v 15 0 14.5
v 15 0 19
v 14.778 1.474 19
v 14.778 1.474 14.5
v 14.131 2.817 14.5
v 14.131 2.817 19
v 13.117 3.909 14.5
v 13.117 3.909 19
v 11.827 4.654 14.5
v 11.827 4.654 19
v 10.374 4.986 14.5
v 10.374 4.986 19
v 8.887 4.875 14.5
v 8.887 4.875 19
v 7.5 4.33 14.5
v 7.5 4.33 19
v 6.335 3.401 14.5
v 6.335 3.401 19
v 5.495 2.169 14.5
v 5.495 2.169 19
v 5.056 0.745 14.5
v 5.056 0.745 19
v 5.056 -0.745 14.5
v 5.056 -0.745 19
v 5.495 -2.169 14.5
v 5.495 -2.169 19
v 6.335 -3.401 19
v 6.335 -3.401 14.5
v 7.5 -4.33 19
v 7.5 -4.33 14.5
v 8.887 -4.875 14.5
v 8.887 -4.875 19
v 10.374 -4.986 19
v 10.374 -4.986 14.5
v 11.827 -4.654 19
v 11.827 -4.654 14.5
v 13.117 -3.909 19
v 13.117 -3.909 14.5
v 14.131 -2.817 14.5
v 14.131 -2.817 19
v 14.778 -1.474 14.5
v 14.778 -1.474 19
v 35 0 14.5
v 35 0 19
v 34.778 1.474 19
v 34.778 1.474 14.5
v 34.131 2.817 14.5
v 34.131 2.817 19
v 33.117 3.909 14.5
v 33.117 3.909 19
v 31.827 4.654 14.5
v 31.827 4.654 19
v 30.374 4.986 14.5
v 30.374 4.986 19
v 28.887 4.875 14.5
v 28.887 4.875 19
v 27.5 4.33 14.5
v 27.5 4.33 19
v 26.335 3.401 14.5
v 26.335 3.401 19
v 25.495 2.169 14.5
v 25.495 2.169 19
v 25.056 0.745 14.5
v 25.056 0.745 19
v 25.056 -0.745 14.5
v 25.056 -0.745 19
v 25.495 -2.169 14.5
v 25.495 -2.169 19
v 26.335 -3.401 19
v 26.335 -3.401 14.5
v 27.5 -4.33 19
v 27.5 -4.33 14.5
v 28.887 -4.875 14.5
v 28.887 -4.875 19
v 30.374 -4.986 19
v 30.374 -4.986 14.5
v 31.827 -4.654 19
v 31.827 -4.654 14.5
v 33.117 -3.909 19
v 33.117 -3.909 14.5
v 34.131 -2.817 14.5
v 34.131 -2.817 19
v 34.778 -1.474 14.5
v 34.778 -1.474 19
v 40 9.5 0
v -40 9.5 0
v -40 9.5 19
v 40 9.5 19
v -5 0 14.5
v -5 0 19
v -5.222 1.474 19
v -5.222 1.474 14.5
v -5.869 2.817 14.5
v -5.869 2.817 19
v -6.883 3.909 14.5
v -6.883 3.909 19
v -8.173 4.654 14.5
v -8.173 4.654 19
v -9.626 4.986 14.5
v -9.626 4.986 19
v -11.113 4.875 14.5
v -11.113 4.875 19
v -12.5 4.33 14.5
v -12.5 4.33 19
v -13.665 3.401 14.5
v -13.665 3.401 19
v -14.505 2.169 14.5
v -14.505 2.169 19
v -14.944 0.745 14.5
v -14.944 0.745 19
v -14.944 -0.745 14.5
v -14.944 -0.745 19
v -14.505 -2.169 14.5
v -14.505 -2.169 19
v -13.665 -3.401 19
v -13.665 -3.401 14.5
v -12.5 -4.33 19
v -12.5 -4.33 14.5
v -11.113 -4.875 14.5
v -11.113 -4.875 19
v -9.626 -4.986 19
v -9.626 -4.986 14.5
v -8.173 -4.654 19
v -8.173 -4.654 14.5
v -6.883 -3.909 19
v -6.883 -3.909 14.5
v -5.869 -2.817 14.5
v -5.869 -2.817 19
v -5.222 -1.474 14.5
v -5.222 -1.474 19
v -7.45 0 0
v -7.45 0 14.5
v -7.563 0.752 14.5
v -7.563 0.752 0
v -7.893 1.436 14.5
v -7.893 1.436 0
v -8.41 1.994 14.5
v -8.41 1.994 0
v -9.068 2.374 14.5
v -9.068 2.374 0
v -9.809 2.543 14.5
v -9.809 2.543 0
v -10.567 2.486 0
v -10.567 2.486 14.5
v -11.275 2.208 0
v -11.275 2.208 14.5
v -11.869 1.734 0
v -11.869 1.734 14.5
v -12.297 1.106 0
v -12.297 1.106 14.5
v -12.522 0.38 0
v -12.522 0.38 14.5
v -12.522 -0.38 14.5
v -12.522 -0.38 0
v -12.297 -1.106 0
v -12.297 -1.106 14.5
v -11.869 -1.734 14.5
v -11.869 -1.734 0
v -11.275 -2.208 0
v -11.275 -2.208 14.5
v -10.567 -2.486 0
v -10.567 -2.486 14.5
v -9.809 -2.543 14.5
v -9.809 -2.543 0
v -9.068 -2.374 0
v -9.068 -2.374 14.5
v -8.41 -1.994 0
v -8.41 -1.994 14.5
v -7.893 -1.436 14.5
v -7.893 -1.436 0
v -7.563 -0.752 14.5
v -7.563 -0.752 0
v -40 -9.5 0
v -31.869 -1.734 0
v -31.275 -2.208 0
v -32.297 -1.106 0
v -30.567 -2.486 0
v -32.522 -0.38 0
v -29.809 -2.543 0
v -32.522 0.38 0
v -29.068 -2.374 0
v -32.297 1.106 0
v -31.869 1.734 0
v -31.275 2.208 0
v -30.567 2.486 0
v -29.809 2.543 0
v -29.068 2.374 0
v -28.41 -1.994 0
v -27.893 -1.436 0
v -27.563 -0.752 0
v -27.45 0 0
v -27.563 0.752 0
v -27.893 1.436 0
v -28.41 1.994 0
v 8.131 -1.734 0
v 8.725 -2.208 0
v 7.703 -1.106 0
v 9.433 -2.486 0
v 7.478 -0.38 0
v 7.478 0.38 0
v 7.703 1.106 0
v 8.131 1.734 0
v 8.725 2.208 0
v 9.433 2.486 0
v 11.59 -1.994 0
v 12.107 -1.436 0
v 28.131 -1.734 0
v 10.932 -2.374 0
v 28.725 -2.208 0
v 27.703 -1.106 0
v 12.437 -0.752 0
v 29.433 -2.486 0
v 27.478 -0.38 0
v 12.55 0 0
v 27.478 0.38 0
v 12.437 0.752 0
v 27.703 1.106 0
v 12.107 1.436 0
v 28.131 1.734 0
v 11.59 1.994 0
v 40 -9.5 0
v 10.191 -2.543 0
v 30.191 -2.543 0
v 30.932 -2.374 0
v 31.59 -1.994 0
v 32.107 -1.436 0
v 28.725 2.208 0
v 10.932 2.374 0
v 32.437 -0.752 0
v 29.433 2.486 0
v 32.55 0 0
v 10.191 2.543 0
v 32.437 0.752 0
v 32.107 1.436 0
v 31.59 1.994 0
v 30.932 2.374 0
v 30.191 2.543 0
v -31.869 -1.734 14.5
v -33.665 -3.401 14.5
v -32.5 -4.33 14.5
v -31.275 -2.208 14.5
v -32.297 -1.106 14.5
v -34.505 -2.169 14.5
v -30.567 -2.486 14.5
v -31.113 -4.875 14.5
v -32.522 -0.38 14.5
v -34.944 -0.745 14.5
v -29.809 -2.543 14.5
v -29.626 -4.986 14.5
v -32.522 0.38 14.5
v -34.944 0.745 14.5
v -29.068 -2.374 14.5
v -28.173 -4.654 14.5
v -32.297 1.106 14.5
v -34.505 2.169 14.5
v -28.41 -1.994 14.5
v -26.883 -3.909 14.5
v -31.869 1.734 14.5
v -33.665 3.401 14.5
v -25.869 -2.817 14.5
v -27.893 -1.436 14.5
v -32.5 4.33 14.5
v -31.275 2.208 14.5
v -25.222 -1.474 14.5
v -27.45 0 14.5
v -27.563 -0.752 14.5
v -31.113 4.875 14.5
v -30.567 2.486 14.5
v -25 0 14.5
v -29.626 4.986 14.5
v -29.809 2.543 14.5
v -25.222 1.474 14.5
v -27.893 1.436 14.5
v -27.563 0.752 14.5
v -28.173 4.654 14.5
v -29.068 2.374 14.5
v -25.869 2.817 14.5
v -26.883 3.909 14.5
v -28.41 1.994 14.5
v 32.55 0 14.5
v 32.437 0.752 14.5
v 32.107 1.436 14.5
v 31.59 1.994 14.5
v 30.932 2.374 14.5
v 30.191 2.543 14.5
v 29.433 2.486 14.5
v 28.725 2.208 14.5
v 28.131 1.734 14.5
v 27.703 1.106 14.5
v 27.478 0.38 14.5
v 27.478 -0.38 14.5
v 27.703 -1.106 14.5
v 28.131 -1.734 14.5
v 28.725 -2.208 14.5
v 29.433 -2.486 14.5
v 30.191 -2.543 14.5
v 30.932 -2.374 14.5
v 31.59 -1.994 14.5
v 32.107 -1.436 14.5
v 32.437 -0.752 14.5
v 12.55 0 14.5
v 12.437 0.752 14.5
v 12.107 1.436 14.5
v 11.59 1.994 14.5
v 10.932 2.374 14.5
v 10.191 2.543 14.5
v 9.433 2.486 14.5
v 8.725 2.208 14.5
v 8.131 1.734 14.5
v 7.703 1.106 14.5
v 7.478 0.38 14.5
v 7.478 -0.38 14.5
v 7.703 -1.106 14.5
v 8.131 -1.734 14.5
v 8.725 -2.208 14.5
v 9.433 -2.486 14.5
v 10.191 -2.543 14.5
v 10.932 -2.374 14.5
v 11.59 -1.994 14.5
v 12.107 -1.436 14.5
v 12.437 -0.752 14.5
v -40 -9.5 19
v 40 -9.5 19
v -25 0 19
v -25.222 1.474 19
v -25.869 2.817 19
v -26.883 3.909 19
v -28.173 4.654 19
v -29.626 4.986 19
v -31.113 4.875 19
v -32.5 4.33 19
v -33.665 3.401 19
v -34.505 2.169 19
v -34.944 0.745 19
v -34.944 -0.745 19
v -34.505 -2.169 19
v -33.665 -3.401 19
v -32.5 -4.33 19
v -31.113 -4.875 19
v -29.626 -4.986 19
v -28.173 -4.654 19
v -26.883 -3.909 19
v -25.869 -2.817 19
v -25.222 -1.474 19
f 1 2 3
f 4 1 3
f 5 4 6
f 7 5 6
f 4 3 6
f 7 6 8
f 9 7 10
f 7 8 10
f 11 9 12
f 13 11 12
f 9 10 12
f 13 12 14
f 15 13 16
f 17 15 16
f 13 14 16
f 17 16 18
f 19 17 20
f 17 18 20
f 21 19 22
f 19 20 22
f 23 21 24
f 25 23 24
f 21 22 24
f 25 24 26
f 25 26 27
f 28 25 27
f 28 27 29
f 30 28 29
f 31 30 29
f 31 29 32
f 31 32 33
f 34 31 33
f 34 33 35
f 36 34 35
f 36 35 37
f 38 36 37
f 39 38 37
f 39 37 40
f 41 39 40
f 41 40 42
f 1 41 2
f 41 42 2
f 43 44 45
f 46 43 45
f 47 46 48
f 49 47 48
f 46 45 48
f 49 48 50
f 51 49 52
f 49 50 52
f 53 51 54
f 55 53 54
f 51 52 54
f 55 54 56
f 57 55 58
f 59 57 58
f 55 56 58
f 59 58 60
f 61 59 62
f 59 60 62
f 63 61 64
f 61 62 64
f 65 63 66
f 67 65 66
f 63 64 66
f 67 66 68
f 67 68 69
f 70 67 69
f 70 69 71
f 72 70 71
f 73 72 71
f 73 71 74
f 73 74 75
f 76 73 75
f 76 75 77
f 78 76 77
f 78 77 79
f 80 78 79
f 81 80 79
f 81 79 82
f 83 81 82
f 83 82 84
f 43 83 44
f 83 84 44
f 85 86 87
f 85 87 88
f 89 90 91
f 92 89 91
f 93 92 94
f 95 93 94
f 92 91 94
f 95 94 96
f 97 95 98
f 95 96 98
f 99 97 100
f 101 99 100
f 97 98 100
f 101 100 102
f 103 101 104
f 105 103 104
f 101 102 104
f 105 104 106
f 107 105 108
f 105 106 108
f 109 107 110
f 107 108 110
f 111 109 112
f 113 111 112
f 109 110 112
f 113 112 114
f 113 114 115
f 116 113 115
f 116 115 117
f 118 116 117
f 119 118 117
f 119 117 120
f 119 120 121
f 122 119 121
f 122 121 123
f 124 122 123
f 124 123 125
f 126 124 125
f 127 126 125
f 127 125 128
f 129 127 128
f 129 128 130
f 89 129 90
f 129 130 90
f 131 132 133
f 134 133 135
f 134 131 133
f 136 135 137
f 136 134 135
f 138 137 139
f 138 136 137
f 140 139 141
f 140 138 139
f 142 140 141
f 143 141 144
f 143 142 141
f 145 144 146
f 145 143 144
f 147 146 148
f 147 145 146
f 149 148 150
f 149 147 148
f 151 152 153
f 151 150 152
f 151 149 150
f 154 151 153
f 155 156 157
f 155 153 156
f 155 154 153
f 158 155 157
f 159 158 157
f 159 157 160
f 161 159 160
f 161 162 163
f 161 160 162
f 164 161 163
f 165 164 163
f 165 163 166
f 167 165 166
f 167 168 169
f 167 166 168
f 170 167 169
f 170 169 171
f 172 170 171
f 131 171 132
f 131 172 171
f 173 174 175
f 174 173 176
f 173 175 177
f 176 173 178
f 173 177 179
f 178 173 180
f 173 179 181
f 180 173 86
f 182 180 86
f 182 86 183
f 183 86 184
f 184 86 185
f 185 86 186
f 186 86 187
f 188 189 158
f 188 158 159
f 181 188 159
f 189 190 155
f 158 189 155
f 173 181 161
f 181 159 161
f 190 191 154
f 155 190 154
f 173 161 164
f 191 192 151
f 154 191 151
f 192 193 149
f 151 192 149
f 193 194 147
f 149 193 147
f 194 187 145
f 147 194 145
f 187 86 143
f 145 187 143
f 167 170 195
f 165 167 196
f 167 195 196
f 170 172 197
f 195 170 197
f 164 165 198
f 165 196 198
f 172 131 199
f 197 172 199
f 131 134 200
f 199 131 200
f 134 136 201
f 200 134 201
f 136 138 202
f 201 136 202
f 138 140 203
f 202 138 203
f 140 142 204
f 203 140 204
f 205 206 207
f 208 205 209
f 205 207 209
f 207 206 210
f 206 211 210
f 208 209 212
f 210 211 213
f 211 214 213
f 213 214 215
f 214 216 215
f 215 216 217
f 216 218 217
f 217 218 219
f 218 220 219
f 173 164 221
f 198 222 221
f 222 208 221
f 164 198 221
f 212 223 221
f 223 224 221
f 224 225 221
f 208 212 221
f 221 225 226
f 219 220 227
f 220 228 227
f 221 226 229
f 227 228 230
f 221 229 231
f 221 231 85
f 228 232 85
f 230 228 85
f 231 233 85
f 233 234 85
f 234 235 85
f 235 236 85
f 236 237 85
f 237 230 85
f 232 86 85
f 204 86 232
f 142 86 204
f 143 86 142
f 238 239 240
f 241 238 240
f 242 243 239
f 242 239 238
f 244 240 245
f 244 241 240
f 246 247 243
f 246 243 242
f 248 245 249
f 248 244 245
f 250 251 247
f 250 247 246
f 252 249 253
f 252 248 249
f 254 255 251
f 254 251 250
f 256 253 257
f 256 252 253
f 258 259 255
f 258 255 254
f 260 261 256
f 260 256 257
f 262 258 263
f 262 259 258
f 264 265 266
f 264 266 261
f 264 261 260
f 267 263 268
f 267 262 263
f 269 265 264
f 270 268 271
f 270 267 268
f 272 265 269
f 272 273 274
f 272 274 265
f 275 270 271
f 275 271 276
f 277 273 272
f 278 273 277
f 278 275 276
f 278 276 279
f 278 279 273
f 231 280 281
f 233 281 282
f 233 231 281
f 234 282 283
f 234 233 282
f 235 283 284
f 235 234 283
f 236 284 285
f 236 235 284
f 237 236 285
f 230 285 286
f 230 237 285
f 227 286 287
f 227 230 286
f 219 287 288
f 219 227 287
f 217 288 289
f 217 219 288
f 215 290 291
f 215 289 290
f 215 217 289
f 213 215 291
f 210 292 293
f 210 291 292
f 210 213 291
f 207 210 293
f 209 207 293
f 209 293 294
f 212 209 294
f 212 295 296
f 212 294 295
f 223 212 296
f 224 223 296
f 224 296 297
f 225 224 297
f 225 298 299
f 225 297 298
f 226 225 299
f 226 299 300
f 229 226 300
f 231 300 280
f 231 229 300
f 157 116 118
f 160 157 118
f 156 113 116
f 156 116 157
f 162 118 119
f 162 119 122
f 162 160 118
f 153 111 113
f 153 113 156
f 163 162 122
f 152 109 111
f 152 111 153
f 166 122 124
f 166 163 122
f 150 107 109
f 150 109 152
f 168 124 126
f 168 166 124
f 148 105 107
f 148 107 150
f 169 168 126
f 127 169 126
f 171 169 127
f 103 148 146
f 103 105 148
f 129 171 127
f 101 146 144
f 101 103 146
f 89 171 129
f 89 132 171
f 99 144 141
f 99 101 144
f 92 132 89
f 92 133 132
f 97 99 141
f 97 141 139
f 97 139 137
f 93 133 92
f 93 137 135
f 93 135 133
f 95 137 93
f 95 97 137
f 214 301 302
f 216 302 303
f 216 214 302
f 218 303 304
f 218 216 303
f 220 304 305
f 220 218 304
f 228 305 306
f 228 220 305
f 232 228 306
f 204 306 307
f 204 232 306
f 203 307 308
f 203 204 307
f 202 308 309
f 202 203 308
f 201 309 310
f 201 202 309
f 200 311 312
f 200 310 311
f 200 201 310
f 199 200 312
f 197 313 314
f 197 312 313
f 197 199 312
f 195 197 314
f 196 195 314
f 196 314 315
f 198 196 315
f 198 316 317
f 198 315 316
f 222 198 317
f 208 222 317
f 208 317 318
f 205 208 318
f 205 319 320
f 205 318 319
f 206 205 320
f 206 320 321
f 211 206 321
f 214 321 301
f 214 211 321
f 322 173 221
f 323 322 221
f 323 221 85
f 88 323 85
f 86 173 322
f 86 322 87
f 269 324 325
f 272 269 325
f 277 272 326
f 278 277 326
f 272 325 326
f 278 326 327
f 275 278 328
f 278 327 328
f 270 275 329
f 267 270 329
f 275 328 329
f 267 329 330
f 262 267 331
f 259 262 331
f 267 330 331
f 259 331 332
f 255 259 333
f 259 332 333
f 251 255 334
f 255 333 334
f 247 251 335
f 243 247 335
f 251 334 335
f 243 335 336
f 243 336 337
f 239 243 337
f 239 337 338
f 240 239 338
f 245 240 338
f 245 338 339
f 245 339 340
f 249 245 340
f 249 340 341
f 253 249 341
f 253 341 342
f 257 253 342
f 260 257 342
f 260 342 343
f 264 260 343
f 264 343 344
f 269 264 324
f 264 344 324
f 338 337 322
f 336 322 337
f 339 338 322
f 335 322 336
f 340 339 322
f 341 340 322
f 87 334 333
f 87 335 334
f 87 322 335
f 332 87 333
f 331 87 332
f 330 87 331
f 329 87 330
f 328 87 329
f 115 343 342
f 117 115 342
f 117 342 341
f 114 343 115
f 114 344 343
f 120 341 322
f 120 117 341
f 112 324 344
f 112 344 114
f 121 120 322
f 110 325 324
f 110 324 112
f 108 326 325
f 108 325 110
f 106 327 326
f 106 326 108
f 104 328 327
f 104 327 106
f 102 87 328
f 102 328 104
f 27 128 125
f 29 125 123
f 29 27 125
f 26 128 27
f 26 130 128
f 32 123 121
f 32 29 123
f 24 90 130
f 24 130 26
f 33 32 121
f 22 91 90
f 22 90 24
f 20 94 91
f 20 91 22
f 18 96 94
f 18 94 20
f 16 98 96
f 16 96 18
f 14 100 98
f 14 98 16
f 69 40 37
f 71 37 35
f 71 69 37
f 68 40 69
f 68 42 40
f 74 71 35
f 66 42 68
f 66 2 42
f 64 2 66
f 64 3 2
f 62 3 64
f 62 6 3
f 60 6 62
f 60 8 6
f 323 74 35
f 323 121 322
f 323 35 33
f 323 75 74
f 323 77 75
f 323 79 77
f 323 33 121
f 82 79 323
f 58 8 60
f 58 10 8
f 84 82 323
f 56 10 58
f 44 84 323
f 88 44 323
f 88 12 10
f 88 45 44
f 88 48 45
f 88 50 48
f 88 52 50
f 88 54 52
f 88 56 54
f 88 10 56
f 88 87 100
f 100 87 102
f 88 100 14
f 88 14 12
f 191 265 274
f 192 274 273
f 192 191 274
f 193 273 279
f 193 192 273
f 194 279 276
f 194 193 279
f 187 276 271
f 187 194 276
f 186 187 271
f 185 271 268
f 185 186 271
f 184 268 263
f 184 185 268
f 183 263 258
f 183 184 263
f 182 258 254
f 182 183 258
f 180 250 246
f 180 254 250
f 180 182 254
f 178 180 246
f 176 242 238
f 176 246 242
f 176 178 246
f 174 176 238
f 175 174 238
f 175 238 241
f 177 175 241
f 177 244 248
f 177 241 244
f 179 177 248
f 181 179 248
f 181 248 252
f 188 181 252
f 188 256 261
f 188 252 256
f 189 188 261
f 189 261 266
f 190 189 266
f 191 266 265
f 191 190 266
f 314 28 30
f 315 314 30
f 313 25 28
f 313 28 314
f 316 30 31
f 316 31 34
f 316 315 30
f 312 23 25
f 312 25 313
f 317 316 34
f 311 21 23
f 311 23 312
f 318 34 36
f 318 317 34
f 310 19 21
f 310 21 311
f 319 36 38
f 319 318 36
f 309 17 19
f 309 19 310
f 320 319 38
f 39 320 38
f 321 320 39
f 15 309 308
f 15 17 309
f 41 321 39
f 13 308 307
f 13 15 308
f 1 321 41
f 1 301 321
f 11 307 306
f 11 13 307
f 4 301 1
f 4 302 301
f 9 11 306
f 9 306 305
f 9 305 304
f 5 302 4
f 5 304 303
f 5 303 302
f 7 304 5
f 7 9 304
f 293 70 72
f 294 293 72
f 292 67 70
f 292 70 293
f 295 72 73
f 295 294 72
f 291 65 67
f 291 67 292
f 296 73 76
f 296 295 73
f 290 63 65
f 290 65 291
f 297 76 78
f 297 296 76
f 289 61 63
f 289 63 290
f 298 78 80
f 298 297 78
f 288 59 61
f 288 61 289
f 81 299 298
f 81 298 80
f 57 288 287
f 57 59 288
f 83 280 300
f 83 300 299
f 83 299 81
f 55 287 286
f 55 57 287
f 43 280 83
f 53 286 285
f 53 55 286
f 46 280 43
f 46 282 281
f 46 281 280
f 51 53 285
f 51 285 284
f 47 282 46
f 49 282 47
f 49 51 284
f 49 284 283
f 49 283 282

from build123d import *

# Parameters (mm, degrees)
F0_W     = 80
F0_H     = 19
F0_R     = 2.55
F1_DEPTH = 19
F2_R     = 5
F3_DEPTH = 4.5


with BuildPart() as f1:
    # F0 (on Top) → F1 (new body)
    with BuildSketch(Plane.XY):
        Rectangle(F0_W, F0_H)
        with Locations((-30, 0)):
            Circle(F0_R, mode=Mode.SUBTRACT)
        with Locations((-10, 0)):
            Circle(F0_R, mode=Mode.SUBTRACT)
        with Locations((10, 0)):
            Circle(F0_R, mode=Mode.SUBTRACT)
        with Locations((30, 0)):
            Circle(F0_R, mode=Mode.SUBTRACT)
    extrude(amount=F1_DEPTH)

    # F2 (on face) → F3 (cut)
    with BuildSketch(Plane.XY.offset(19)):
        with Locations((-30, 0)):
            Circle(F2_R)
        with Locations((-10, 0)):
            Circle(F2_R)
        with Locations((10, 0)):
            Circle(F2_R)
        with Locations((30, 0)):
            Circle(F2_R)
    extrude(amount=-F3_DEPTH, mode=Mode.SUBTRACT)


solid = f1.part
